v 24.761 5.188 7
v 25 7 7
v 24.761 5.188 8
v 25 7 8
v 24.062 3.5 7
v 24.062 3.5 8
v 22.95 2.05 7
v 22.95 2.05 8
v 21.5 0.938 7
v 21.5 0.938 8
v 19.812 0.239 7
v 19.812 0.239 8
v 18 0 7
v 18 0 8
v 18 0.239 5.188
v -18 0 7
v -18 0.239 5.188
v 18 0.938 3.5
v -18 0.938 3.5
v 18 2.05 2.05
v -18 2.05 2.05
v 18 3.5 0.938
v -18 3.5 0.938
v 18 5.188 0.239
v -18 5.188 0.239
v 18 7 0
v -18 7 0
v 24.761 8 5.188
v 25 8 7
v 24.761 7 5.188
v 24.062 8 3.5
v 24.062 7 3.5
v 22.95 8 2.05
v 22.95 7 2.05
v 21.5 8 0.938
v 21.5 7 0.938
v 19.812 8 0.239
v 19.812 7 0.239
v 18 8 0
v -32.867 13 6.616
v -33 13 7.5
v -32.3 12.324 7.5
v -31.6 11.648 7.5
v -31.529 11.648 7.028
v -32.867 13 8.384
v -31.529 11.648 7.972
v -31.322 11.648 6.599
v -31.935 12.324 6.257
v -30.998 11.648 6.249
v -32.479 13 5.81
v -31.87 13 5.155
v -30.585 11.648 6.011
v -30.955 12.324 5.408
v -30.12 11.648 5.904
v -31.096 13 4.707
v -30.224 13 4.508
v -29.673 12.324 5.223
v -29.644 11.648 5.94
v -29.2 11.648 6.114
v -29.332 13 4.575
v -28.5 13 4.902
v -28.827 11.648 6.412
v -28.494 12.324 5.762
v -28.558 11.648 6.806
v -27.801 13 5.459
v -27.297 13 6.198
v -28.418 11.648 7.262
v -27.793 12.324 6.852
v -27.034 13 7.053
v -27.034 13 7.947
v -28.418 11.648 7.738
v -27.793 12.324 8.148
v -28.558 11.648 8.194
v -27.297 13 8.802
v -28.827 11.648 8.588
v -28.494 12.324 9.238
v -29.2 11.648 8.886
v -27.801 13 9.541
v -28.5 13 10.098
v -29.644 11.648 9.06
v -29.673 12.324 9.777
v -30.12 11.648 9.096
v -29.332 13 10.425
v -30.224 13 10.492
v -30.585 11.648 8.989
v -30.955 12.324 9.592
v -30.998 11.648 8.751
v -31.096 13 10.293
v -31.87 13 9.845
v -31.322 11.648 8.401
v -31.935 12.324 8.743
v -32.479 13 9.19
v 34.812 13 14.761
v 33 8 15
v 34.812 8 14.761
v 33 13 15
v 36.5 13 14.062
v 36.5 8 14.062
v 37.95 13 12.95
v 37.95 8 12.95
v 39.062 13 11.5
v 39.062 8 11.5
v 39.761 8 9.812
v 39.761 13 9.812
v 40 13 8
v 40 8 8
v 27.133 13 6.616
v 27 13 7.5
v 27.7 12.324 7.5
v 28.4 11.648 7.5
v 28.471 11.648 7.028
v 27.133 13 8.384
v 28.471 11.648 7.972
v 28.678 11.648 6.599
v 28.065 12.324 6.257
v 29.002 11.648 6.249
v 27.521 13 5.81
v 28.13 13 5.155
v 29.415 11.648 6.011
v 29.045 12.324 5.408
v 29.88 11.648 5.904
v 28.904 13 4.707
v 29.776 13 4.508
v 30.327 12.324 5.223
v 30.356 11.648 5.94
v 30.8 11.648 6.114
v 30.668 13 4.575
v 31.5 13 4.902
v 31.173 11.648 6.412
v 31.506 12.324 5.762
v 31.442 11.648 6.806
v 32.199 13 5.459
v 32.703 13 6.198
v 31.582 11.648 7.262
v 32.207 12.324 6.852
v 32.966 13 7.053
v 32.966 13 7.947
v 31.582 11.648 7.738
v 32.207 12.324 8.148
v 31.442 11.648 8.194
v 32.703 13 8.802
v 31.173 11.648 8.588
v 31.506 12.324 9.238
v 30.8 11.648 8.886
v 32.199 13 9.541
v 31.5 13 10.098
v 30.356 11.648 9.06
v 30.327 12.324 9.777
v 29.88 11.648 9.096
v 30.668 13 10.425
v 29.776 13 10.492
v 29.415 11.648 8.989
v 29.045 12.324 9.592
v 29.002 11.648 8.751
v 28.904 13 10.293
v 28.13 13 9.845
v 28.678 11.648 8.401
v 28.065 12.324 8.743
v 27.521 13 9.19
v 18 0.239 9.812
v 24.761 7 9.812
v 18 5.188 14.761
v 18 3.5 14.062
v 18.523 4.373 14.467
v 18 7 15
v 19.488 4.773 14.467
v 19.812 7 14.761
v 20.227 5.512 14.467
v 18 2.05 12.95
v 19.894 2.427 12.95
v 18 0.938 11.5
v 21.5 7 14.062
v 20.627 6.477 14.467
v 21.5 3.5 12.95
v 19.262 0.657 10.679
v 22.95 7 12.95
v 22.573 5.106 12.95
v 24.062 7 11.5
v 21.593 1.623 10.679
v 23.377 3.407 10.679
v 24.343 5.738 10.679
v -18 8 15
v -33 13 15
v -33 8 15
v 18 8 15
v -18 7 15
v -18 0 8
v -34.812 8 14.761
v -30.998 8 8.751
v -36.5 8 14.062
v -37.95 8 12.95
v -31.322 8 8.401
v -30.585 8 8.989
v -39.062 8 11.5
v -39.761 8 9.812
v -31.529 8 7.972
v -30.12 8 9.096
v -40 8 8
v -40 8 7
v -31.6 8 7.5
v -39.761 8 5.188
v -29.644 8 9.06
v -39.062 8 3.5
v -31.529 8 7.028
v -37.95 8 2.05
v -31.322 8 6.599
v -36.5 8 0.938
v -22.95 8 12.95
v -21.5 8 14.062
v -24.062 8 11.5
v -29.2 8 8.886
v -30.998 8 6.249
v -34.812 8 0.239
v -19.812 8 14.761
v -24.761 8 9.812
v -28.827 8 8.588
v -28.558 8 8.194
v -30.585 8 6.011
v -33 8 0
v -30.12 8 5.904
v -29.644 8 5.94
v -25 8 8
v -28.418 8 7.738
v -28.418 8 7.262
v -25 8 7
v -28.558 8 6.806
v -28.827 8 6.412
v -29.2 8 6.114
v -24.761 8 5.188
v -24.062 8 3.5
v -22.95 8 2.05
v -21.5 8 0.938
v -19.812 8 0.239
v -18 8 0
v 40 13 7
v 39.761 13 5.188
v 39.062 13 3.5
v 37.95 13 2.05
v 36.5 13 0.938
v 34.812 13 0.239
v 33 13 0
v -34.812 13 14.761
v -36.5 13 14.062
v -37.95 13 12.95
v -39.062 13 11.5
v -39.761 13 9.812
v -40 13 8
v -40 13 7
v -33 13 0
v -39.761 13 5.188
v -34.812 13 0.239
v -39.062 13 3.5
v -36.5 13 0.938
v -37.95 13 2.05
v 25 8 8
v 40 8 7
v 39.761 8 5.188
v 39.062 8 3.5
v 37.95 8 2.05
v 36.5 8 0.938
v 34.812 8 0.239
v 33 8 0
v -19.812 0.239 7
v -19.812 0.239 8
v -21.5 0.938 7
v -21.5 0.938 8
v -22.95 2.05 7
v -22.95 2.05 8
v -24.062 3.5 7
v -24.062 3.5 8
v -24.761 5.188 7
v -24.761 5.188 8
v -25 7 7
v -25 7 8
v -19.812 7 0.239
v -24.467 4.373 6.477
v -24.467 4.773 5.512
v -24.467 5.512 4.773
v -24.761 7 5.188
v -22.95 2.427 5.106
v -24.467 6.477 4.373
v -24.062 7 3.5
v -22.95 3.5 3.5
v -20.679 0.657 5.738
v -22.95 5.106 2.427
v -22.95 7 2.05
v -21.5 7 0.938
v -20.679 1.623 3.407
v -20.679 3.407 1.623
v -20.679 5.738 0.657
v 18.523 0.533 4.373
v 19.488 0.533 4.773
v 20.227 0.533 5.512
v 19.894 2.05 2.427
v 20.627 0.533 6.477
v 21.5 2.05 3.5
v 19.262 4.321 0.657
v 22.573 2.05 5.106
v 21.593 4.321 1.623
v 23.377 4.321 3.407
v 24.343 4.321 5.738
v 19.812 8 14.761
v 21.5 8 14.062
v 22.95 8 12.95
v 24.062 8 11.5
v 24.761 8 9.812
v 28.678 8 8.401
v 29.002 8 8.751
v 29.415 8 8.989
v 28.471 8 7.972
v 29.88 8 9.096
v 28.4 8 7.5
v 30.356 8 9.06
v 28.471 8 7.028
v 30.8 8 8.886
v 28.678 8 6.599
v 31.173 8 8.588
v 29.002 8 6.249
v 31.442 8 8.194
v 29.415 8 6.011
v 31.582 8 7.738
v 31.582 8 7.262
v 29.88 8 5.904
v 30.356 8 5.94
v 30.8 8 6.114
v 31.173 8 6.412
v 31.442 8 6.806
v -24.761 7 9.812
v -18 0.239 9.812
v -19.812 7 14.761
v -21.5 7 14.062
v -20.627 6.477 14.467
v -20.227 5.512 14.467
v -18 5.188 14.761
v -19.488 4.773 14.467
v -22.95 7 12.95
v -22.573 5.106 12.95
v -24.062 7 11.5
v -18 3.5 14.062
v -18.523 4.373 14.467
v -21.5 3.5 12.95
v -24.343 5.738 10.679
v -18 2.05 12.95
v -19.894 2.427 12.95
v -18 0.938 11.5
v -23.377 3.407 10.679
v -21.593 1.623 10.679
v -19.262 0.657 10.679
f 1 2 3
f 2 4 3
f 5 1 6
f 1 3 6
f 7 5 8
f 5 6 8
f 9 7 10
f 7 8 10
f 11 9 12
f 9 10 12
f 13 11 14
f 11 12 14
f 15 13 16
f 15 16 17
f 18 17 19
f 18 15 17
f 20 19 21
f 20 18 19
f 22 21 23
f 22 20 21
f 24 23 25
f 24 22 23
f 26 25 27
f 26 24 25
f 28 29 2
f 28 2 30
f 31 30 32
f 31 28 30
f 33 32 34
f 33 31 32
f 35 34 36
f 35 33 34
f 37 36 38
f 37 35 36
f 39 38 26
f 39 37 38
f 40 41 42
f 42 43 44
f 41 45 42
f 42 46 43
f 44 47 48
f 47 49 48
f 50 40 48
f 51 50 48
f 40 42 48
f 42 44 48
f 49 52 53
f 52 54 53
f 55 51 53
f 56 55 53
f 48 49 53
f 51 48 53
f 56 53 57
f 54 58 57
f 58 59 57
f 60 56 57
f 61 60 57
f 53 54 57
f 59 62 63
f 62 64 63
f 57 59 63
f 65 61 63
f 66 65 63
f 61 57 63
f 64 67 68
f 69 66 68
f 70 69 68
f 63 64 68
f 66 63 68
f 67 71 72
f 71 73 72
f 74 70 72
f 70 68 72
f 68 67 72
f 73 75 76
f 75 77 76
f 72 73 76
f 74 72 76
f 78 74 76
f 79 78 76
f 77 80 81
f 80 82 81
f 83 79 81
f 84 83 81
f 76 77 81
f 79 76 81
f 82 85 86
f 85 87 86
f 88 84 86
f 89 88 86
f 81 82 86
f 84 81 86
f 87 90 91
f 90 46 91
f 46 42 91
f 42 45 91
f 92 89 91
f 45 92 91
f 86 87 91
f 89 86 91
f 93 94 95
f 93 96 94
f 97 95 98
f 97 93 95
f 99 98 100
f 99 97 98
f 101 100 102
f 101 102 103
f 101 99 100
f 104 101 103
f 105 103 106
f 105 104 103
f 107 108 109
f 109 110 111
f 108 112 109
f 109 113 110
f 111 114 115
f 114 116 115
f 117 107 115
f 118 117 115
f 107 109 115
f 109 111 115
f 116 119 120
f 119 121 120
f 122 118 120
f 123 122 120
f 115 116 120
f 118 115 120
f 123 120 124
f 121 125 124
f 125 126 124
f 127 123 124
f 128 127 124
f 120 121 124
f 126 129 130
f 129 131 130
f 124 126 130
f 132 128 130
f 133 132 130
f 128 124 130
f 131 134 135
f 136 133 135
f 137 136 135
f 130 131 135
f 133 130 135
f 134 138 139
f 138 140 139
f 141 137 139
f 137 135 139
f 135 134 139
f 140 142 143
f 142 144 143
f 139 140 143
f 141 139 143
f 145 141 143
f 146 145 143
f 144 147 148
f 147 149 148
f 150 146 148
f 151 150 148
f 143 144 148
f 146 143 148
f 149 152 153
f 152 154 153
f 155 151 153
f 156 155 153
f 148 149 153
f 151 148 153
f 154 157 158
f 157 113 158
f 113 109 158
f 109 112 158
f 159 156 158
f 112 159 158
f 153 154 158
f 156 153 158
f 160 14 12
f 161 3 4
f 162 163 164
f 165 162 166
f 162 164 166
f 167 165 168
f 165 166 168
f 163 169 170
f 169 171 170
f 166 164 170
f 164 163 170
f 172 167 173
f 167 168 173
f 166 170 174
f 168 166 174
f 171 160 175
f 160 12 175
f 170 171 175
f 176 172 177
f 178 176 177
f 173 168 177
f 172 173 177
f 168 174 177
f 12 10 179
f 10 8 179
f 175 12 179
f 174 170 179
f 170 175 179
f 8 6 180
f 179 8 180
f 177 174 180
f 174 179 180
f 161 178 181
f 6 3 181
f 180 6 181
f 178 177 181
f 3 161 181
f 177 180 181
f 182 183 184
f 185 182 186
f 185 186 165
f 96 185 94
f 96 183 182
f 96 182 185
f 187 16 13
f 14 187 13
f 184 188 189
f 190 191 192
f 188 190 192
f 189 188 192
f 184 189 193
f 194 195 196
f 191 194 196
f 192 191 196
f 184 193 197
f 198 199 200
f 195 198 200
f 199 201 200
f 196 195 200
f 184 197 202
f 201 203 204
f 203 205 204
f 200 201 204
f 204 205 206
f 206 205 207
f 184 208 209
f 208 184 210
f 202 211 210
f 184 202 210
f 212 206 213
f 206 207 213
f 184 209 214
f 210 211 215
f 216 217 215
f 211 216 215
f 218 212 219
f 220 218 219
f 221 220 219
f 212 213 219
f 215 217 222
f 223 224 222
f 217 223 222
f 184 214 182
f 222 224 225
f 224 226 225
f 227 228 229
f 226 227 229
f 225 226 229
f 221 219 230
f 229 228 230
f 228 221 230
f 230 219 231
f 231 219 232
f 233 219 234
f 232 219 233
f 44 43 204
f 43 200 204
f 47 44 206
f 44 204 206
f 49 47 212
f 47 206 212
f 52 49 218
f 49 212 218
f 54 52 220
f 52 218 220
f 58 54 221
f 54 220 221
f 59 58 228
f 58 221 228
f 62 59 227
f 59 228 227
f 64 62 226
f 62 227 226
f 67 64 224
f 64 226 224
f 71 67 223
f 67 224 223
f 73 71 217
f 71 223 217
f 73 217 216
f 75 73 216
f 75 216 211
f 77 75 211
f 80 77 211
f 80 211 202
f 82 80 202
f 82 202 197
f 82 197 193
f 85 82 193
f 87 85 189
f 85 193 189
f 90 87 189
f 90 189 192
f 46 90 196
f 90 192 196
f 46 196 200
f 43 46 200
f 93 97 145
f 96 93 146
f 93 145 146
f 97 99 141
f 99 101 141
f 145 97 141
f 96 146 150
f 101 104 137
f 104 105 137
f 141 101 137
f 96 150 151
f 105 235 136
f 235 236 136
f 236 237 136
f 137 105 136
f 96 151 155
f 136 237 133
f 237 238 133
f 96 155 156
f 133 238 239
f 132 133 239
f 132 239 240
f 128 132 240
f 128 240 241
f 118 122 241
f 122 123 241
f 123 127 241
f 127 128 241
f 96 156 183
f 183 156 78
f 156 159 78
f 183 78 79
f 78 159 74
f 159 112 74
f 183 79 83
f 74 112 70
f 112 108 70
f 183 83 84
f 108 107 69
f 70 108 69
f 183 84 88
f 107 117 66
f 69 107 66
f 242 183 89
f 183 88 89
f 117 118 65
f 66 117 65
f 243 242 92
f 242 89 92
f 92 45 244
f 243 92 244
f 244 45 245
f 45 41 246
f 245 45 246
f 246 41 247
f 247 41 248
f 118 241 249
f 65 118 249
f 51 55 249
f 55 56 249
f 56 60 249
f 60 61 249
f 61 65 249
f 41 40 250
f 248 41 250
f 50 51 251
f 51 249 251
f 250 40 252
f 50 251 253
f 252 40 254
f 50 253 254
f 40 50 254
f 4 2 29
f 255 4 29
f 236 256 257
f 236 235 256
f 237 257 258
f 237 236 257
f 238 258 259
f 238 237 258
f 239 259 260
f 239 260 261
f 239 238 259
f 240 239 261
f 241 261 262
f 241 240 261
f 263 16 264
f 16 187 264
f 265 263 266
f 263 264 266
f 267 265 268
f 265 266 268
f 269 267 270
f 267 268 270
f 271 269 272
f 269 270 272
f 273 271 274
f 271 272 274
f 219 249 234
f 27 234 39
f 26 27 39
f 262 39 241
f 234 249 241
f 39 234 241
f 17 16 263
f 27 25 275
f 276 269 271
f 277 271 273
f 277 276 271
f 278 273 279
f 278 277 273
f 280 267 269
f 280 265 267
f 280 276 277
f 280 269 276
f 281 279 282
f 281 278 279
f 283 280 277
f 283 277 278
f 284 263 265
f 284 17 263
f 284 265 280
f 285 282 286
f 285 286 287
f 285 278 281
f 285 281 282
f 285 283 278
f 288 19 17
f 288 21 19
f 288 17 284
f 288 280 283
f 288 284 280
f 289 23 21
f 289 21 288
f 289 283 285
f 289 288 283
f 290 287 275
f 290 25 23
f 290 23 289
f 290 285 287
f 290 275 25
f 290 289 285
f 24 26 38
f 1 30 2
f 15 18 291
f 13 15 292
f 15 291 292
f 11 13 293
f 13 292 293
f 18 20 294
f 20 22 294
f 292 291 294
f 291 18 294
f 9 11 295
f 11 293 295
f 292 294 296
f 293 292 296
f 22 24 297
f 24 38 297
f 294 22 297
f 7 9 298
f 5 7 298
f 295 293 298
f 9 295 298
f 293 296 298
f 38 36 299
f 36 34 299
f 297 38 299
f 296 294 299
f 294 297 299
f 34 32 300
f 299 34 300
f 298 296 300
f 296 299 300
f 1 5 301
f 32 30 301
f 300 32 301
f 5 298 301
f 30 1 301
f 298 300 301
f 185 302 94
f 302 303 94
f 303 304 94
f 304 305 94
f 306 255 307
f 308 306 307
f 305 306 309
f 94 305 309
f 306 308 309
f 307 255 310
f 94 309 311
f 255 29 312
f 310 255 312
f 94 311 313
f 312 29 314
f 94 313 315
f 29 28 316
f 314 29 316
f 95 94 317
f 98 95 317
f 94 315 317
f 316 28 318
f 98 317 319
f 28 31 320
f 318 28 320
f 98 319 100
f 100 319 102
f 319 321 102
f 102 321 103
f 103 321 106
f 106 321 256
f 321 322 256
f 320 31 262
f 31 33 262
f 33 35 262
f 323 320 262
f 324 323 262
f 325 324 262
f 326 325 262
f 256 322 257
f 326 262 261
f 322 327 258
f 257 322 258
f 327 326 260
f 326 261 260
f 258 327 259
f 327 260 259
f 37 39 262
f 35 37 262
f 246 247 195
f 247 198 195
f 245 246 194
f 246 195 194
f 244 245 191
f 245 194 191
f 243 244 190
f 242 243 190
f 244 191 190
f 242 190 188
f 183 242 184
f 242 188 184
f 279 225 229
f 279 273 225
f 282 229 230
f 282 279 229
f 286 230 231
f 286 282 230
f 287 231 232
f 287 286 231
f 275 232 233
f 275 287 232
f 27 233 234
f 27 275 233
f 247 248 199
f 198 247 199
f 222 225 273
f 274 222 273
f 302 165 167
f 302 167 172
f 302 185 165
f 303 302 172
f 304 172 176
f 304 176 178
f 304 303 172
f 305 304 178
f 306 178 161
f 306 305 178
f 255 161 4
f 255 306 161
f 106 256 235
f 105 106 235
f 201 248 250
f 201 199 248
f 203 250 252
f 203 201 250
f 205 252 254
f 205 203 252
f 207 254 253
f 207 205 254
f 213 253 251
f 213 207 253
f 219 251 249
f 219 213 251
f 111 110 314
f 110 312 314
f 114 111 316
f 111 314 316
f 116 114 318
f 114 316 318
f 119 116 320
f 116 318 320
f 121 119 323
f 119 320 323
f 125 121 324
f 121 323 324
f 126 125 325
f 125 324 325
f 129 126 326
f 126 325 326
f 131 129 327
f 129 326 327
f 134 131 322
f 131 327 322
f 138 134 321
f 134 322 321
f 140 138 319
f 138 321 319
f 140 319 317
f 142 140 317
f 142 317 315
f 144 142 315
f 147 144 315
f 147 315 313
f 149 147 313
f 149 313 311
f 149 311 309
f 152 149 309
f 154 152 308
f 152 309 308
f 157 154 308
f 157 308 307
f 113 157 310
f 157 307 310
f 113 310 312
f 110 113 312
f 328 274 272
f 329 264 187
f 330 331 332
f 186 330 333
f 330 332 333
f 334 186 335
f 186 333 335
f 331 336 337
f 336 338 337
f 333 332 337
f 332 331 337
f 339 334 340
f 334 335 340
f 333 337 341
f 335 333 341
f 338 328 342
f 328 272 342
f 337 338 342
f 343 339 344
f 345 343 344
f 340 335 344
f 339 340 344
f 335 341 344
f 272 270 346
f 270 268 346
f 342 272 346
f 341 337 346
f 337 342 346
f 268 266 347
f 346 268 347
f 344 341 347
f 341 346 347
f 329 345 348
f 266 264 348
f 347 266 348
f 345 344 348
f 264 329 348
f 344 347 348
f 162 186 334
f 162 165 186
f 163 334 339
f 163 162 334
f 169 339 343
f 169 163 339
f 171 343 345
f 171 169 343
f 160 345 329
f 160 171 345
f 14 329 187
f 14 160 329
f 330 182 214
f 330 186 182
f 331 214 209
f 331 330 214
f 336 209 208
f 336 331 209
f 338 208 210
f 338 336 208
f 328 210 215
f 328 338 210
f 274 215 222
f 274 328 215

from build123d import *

# Parameters (mm, degrees)
BOSS_EXTRU_1_DEPTH                                 = 15
FRAISAGE_POUR_VIS_T_TE_FRAIS_E_CRUCIFO_D           = 3.2
FRAISAGE_POUR_VIS_T_TE_FRAIS_E_CRUCIFO_CSINK_D     = 6
FRAISAGE_POUR_VIS_T_TE_FRAIS_E_CRUCIFO_CSINK_ANGLE = 92
CONG_1_R                                           = 7


with BuildPart() as part:
    # Esquisse1 → Boss.-Extru.1 (new body)
    with BuildSketch(Plane.XY):
        Polygon((0, 13), (-40, 13), (-40, 8), (-25, 8), (-25, 0), (0, 0), align=None)
        Polygon((40, 13), (0, 13), (0, 0), (25, 0), (25, 8), (40, 8), align=None)
    extrude(amount=BOSS_EXTRU_1_DEPTH)

    # Fraisage pour vis à tête fraisée cruciforme M31 (through all)
    with Locations(Plane(origin=(0, 13, 0), x_dir=(1, 0, 0), z_dir=(0, 1, 0))):
        with Locations((-30, -7.5), (30, -7.5)):
            CounterSinkHole(FRAISAGE_POUR_VIS_T_TE_FRAIS_E_CRUCIFO_D / 2, FRAISAGE_POUR_VIS_T_TE_FRAIS_E_CRUCIFO_CSINK_D / 2, counter_sink_angle=FRAISAGE_POUR_VIS_T_TE_FRAIS_E_CRUCIFO_CSINK_ANGLE)

    # Congé1
    cong_1_edges = [part.edges().sort_by_distance(p)[0] for p in [
        (40, 10.5, 0),
        (25, 4, 0),
        (0, 0, 0),
        (-25, 0, 7.5),
        (25, 0, 7.5),
        (40, 10.5, 15),
        (-40, 10.5, 15),
        (-25, 4, 15),
        (0, 0, 15),
        (-25, 4, 0),
        (25, 4, 15),
        (-40, 10.5, 0),
    ]]
    fillet(cong_1_edges, radius=CONG_1_R)


solid = part.part
